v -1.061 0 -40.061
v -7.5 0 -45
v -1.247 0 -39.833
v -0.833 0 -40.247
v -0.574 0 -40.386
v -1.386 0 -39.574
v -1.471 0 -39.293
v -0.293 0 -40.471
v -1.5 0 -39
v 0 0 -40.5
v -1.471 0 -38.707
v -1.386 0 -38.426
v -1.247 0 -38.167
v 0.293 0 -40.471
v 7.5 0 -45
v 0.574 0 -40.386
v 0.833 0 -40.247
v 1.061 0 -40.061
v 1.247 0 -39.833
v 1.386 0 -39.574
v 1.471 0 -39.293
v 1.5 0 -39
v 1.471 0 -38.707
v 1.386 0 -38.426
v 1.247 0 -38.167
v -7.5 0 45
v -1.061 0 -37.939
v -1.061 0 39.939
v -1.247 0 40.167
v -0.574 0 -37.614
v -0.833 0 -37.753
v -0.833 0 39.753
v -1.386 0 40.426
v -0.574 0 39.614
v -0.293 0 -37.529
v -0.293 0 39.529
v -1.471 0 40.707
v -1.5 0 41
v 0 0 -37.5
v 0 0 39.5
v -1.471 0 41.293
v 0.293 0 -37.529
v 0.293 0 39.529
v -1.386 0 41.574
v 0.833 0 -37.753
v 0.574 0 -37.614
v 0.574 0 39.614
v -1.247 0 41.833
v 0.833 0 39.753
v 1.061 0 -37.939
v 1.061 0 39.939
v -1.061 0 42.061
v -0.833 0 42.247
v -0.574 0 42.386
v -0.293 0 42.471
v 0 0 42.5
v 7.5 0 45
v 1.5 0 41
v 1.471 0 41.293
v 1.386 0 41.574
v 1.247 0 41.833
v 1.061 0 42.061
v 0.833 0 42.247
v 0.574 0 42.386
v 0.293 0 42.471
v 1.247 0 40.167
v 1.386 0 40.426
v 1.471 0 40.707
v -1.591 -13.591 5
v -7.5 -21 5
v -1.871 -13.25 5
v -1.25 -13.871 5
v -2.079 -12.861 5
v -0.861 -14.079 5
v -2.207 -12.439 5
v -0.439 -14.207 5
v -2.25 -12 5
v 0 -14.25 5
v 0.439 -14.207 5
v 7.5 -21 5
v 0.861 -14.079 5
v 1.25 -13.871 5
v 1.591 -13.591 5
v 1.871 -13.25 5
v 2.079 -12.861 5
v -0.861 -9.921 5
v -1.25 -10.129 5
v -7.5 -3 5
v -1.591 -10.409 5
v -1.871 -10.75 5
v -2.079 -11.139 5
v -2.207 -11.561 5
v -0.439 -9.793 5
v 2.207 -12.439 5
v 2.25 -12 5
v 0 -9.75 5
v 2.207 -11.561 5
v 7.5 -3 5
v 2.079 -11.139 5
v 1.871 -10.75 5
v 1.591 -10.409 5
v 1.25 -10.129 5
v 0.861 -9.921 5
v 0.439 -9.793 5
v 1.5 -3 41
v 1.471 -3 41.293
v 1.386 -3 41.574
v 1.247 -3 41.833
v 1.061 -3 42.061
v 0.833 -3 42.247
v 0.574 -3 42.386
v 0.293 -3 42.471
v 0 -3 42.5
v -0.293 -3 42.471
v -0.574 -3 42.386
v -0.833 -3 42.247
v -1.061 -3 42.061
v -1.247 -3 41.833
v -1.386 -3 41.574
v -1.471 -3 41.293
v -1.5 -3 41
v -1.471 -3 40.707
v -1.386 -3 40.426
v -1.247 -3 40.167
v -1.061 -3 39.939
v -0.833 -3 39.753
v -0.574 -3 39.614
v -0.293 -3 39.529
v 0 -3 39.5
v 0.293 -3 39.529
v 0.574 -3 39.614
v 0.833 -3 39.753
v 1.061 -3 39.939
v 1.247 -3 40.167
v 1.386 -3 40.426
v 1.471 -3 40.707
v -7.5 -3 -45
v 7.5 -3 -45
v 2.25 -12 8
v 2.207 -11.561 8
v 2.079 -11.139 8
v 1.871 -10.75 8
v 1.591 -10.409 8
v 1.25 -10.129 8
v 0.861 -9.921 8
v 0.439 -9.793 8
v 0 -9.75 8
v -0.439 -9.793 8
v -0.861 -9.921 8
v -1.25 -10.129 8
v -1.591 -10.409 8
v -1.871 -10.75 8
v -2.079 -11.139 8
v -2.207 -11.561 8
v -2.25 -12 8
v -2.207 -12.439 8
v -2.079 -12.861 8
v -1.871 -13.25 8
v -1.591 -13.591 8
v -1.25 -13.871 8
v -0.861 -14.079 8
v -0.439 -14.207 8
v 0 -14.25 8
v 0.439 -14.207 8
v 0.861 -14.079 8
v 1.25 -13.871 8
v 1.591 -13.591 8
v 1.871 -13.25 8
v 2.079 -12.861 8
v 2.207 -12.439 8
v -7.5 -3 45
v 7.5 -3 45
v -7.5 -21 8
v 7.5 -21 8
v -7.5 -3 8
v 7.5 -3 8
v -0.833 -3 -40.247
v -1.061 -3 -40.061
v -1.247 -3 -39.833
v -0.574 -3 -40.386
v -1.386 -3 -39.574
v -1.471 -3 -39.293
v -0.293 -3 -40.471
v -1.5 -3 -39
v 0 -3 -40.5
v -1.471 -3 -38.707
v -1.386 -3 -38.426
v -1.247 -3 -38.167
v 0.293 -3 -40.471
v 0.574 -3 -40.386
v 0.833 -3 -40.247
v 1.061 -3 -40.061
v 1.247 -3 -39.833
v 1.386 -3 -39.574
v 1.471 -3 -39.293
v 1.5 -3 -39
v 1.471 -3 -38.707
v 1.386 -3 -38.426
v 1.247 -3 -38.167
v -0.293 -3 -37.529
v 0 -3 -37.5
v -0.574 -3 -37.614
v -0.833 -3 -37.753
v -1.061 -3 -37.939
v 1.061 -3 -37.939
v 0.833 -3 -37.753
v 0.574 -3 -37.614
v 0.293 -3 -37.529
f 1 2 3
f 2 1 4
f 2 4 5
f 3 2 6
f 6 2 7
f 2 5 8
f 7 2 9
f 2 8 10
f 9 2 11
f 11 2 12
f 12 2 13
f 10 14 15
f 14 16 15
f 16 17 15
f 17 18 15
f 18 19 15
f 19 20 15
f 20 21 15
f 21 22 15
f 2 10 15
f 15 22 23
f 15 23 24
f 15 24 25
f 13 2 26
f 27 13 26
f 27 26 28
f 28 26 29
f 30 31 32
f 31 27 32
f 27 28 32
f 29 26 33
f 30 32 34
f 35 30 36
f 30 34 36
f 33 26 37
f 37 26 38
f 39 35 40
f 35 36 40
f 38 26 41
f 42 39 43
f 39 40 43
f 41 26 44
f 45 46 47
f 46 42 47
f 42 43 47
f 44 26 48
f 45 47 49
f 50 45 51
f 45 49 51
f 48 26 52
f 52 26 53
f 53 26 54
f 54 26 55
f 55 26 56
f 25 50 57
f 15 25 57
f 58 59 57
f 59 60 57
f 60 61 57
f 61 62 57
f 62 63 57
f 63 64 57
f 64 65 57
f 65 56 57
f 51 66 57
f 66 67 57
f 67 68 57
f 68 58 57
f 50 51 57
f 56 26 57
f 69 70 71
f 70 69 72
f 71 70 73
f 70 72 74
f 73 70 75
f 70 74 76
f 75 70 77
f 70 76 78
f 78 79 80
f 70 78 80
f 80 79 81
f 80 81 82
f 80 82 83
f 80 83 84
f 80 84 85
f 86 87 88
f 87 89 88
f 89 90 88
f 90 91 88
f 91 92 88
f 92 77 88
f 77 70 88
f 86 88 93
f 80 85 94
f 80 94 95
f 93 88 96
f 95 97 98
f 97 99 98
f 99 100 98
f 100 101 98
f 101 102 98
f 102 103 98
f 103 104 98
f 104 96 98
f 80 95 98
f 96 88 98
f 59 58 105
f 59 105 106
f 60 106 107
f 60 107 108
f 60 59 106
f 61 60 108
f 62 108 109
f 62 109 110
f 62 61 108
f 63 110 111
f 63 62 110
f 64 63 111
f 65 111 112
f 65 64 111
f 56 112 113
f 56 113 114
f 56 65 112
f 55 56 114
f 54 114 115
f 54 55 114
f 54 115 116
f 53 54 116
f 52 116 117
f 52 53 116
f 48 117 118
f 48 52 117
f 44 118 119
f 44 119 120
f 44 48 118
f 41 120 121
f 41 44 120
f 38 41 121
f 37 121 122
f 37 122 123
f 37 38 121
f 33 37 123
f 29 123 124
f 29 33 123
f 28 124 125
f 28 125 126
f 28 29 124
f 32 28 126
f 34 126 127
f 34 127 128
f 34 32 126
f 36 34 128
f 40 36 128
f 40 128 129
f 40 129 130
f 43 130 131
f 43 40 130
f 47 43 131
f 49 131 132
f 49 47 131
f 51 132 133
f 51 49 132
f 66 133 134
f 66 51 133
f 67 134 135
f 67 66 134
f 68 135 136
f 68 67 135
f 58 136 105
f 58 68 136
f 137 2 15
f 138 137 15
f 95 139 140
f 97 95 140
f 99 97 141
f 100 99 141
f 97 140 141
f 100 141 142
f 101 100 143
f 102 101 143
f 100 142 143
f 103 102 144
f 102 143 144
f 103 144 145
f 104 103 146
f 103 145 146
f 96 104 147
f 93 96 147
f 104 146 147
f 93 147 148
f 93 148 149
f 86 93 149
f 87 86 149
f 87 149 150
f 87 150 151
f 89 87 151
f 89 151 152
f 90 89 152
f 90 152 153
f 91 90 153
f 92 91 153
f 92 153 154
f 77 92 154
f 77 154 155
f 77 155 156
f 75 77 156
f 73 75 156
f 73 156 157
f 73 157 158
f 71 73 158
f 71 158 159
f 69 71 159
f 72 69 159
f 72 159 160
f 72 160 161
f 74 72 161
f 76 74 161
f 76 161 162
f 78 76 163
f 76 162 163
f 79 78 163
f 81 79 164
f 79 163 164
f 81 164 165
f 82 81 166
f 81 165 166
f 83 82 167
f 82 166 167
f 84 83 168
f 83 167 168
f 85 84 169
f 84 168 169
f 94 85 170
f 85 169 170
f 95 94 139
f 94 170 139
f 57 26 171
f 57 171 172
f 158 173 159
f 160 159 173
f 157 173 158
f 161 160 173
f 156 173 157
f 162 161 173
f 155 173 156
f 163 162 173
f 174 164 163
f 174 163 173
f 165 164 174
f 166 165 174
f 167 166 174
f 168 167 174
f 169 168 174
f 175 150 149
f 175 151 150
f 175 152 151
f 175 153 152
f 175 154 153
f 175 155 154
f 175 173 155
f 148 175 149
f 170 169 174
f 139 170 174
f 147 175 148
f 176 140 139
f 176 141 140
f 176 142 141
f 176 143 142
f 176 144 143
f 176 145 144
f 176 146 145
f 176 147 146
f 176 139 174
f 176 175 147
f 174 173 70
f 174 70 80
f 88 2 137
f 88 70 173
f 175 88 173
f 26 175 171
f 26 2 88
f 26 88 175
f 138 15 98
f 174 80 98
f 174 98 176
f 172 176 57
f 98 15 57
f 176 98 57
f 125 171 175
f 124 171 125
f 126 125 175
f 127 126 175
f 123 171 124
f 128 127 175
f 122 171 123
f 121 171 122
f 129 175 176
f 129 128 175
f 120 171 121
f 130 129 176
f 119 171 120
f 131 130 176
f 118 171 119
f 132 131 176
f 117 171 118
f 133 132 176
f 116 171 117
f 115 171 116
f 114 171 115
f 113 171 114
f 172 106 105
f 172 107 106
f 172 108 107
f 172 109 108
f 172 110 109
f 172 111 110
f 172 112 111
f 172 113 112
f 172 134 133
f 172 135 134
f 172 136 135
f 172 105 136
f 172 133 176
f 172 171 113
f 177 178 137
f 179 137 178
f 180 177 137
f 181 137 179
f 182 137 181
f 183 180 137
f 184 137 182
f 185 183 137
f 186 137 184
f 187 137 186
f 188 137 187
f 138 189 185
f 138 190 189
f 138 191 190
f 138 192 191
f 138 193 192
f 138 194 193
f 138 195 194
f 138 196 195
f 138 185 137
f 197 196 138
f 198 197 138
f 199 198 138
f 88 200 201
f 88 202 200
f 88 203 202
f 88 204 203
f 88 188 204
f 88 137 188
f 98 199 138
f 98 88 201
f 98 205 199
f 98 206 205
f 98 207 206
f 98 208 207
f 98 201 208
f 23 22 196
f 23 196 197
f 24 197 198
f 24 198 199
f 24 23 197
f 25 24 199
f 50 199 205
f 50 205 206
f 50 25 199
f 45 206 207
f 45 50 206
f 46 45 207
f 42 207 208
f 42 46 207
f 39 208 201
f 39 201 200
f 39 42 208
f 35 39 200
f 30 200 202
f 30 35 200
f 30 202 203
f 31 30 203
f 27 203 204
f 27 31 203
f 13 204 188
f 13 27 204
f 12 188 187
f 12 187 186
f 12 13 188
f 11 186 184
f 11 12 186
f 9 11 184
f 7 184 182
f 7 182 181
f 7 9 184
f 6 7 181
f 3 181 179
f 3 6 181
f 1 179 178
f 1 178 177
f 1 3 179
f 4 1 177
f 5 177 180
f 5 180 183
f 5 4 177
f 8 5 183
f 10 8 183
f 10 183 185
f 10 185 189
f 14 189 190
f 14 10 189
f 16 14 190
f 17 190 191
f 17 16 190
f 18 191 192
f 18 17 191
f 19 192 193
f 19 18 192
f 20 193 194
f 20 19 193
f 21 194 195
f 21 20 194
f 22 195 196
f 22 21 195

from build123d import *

# Parameters (mm, degrees)
F0_W     = 15
F0_H     = 90
F0_R     = 1.5
F1_DEPTH = 3
F2_W     = 15
F2_H     = 3
F3_DEPTH = 18
F4_R     = 2.25
F5_DEPTH = 53.001


with BuildPart() as f1:
    # F0 (on Front) → F1 (new body)
    with BuildSketch(Plane.XZ):
        Rectangle(F0_W, F0_H)
        with Locations((0, -39)):
            Circle(F0_R, mode=Mode.SUBTRACT)
        with Locations((0, 41)):
            Circle(F0_R, mode=Mode.SUBTRACT)
    extrude(amount=F1_DEPTH)

    # F2 (on face) → F3 (join)
    with BuildSketch(Plane.XZ.offset(3)):
        with Locations((0, 6.5)):
            Rectangle(F2_W, F2_H)
    extrude(amount=F3_DEPTH)

    # F4 (on face) → F5 (cut, through all)
    with BuildSketch(Plane.XY.offset(8)):
        with Locations((0, -12)):
            Circle(F4_R)
    extrude(amount=-F5_DEPTH, mode=Mode.SUBTRACT)


solid = f1.part
